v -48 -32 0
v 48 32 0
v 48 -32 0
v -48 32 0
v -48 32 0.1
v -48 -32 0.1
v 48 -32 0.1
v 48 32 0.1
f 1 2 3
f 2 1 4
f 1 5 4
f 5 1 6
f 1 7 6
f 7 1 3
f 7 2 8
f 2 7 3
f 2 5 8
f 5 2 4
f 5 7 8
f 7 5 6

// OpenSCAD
// file: ../p/box5-12.scad
use <../lib.scad>
function ldraw_lib__box5_12() = [
// 0 Box with 5 Faces without Any Edges
// 0 Name: box5-12.dat
// 0 Author: Chris Dee [cwdee]
// 0 !LDRAW_ORG Primitive UPDATE 2009-02
// 0 !LICENSE Licensed under CC BY 4.0 : see CAreadme.txt
// 
// 0 BFC CERTIFY CCW
  [0,"BFC","CERTIFY"],
  [0,"BFC","CCW"],
// 
// 0 !HISTORY 2009-09-03 [PTadmin] Official Update 2009-02
// 
// 
// 4 16 1 1 1 1 1 -1 -1 1 -1 -1 1 1
  [4,16,1,1,1,1,1,-1,-1,1,-1,-1,1,1],
// 4 16 -1 0 1 1 0 1 1 1 1 -1 1 1
  [4,16,-1,0,1,1,0,1,1,1,1,-1,1,1],
// 4 16 -1 0 -1 -1 0 1 -1 1 1 -1 1 -1
  [4,16,-1,0,-1,-1,0,1,-1,1,1,-1,1,-1],
// 4 16 1 0 -1 -1 0 -1 -1 1 -1 1 1 -1
  [4,16,1,0,-1,-1,0,-1,-1,1,-1,1,1,-1],
// 4 16 1 0 1 1 0 -1 1 1 -1 1 1 1
  [4,16,1,0,1,1,0,-1,1,1,-1,1,1,1],
// 0
];
module ldraw_lib__box5_12(step=0, col=false, unit=2/5, alt=false, line=0.2, solid=!$preview)
    makepoly(ldraw_lib__box5_12(), step=step, col=col, unit=unit, alt=alt, line=line, solid=solid);
ldraw_lib__box5_12(line=0.2);
// main file
use <../lib.scad>
use <../p/box5-12.scad>
function ldraw_lib__4141502a() = [
// 0 Sticker  8 x 12 with UCS X-Wing Fighter
// 0 Name: 4141502a.dat
// 0 Author: Orion Pobursky [OrionP]
// 0 !LDRAW_ORG Part UPDATE 2022-02
// 0 !LICENSE Licensed under CC BY 4.0 : see CAreadme.txt
// 
// 0 BFC CERTIFY CCW
  [0,"BFC","CERTIFY"],
  [0,"BFC","CCW"],
// 
// 0 !KEYWORDS Set 7191
// 
// 0 !HISTORY 2022-03-06 [PTadmin] Official Update 2022-02
// 
// 
// 1 16 0 -0.25 0 0 0 -120 0 0.25 0 80 0 0 box5-12.dat
  [1,16,0,-0.25,0,0,0,-120,0,0.25,0,80,0,0, ldraw_lib__box5_12()],
// 0 !TEXMAP START PLANAR -120 -0.25 80 120 -0.25 80 -120 -0.25 -80 4141502a.png
// 0 !: 4 0 -120 -0.25 80 -120 -0.25 -80 120 -0.25 -80 120 -0.25 80
// 0 !TEXMAP FALLBACK
// 0 // Needs Work: fallback pattern
// 4 0 -120 -0.25 80 -120 -0.25 -80 120 -0.25 -80 120 -0.25 80
  [4,0,-120,-0.25,80,-120,-0.25,-80,120,-0.25,-80,120,-0.25,80],
// 0 !TEXMAP END
];
module ldraw_lib__4141502a(step=0, col=false, unit=2/5, alt=false, line=0.2, solid=!$preview)
    makepoly(ldraw_lib__4141502a(), step=step, col=col, unit=unit, alt=alt, line=line, solid=solid);
ldraw_lib__4141502a(line=0.2);
